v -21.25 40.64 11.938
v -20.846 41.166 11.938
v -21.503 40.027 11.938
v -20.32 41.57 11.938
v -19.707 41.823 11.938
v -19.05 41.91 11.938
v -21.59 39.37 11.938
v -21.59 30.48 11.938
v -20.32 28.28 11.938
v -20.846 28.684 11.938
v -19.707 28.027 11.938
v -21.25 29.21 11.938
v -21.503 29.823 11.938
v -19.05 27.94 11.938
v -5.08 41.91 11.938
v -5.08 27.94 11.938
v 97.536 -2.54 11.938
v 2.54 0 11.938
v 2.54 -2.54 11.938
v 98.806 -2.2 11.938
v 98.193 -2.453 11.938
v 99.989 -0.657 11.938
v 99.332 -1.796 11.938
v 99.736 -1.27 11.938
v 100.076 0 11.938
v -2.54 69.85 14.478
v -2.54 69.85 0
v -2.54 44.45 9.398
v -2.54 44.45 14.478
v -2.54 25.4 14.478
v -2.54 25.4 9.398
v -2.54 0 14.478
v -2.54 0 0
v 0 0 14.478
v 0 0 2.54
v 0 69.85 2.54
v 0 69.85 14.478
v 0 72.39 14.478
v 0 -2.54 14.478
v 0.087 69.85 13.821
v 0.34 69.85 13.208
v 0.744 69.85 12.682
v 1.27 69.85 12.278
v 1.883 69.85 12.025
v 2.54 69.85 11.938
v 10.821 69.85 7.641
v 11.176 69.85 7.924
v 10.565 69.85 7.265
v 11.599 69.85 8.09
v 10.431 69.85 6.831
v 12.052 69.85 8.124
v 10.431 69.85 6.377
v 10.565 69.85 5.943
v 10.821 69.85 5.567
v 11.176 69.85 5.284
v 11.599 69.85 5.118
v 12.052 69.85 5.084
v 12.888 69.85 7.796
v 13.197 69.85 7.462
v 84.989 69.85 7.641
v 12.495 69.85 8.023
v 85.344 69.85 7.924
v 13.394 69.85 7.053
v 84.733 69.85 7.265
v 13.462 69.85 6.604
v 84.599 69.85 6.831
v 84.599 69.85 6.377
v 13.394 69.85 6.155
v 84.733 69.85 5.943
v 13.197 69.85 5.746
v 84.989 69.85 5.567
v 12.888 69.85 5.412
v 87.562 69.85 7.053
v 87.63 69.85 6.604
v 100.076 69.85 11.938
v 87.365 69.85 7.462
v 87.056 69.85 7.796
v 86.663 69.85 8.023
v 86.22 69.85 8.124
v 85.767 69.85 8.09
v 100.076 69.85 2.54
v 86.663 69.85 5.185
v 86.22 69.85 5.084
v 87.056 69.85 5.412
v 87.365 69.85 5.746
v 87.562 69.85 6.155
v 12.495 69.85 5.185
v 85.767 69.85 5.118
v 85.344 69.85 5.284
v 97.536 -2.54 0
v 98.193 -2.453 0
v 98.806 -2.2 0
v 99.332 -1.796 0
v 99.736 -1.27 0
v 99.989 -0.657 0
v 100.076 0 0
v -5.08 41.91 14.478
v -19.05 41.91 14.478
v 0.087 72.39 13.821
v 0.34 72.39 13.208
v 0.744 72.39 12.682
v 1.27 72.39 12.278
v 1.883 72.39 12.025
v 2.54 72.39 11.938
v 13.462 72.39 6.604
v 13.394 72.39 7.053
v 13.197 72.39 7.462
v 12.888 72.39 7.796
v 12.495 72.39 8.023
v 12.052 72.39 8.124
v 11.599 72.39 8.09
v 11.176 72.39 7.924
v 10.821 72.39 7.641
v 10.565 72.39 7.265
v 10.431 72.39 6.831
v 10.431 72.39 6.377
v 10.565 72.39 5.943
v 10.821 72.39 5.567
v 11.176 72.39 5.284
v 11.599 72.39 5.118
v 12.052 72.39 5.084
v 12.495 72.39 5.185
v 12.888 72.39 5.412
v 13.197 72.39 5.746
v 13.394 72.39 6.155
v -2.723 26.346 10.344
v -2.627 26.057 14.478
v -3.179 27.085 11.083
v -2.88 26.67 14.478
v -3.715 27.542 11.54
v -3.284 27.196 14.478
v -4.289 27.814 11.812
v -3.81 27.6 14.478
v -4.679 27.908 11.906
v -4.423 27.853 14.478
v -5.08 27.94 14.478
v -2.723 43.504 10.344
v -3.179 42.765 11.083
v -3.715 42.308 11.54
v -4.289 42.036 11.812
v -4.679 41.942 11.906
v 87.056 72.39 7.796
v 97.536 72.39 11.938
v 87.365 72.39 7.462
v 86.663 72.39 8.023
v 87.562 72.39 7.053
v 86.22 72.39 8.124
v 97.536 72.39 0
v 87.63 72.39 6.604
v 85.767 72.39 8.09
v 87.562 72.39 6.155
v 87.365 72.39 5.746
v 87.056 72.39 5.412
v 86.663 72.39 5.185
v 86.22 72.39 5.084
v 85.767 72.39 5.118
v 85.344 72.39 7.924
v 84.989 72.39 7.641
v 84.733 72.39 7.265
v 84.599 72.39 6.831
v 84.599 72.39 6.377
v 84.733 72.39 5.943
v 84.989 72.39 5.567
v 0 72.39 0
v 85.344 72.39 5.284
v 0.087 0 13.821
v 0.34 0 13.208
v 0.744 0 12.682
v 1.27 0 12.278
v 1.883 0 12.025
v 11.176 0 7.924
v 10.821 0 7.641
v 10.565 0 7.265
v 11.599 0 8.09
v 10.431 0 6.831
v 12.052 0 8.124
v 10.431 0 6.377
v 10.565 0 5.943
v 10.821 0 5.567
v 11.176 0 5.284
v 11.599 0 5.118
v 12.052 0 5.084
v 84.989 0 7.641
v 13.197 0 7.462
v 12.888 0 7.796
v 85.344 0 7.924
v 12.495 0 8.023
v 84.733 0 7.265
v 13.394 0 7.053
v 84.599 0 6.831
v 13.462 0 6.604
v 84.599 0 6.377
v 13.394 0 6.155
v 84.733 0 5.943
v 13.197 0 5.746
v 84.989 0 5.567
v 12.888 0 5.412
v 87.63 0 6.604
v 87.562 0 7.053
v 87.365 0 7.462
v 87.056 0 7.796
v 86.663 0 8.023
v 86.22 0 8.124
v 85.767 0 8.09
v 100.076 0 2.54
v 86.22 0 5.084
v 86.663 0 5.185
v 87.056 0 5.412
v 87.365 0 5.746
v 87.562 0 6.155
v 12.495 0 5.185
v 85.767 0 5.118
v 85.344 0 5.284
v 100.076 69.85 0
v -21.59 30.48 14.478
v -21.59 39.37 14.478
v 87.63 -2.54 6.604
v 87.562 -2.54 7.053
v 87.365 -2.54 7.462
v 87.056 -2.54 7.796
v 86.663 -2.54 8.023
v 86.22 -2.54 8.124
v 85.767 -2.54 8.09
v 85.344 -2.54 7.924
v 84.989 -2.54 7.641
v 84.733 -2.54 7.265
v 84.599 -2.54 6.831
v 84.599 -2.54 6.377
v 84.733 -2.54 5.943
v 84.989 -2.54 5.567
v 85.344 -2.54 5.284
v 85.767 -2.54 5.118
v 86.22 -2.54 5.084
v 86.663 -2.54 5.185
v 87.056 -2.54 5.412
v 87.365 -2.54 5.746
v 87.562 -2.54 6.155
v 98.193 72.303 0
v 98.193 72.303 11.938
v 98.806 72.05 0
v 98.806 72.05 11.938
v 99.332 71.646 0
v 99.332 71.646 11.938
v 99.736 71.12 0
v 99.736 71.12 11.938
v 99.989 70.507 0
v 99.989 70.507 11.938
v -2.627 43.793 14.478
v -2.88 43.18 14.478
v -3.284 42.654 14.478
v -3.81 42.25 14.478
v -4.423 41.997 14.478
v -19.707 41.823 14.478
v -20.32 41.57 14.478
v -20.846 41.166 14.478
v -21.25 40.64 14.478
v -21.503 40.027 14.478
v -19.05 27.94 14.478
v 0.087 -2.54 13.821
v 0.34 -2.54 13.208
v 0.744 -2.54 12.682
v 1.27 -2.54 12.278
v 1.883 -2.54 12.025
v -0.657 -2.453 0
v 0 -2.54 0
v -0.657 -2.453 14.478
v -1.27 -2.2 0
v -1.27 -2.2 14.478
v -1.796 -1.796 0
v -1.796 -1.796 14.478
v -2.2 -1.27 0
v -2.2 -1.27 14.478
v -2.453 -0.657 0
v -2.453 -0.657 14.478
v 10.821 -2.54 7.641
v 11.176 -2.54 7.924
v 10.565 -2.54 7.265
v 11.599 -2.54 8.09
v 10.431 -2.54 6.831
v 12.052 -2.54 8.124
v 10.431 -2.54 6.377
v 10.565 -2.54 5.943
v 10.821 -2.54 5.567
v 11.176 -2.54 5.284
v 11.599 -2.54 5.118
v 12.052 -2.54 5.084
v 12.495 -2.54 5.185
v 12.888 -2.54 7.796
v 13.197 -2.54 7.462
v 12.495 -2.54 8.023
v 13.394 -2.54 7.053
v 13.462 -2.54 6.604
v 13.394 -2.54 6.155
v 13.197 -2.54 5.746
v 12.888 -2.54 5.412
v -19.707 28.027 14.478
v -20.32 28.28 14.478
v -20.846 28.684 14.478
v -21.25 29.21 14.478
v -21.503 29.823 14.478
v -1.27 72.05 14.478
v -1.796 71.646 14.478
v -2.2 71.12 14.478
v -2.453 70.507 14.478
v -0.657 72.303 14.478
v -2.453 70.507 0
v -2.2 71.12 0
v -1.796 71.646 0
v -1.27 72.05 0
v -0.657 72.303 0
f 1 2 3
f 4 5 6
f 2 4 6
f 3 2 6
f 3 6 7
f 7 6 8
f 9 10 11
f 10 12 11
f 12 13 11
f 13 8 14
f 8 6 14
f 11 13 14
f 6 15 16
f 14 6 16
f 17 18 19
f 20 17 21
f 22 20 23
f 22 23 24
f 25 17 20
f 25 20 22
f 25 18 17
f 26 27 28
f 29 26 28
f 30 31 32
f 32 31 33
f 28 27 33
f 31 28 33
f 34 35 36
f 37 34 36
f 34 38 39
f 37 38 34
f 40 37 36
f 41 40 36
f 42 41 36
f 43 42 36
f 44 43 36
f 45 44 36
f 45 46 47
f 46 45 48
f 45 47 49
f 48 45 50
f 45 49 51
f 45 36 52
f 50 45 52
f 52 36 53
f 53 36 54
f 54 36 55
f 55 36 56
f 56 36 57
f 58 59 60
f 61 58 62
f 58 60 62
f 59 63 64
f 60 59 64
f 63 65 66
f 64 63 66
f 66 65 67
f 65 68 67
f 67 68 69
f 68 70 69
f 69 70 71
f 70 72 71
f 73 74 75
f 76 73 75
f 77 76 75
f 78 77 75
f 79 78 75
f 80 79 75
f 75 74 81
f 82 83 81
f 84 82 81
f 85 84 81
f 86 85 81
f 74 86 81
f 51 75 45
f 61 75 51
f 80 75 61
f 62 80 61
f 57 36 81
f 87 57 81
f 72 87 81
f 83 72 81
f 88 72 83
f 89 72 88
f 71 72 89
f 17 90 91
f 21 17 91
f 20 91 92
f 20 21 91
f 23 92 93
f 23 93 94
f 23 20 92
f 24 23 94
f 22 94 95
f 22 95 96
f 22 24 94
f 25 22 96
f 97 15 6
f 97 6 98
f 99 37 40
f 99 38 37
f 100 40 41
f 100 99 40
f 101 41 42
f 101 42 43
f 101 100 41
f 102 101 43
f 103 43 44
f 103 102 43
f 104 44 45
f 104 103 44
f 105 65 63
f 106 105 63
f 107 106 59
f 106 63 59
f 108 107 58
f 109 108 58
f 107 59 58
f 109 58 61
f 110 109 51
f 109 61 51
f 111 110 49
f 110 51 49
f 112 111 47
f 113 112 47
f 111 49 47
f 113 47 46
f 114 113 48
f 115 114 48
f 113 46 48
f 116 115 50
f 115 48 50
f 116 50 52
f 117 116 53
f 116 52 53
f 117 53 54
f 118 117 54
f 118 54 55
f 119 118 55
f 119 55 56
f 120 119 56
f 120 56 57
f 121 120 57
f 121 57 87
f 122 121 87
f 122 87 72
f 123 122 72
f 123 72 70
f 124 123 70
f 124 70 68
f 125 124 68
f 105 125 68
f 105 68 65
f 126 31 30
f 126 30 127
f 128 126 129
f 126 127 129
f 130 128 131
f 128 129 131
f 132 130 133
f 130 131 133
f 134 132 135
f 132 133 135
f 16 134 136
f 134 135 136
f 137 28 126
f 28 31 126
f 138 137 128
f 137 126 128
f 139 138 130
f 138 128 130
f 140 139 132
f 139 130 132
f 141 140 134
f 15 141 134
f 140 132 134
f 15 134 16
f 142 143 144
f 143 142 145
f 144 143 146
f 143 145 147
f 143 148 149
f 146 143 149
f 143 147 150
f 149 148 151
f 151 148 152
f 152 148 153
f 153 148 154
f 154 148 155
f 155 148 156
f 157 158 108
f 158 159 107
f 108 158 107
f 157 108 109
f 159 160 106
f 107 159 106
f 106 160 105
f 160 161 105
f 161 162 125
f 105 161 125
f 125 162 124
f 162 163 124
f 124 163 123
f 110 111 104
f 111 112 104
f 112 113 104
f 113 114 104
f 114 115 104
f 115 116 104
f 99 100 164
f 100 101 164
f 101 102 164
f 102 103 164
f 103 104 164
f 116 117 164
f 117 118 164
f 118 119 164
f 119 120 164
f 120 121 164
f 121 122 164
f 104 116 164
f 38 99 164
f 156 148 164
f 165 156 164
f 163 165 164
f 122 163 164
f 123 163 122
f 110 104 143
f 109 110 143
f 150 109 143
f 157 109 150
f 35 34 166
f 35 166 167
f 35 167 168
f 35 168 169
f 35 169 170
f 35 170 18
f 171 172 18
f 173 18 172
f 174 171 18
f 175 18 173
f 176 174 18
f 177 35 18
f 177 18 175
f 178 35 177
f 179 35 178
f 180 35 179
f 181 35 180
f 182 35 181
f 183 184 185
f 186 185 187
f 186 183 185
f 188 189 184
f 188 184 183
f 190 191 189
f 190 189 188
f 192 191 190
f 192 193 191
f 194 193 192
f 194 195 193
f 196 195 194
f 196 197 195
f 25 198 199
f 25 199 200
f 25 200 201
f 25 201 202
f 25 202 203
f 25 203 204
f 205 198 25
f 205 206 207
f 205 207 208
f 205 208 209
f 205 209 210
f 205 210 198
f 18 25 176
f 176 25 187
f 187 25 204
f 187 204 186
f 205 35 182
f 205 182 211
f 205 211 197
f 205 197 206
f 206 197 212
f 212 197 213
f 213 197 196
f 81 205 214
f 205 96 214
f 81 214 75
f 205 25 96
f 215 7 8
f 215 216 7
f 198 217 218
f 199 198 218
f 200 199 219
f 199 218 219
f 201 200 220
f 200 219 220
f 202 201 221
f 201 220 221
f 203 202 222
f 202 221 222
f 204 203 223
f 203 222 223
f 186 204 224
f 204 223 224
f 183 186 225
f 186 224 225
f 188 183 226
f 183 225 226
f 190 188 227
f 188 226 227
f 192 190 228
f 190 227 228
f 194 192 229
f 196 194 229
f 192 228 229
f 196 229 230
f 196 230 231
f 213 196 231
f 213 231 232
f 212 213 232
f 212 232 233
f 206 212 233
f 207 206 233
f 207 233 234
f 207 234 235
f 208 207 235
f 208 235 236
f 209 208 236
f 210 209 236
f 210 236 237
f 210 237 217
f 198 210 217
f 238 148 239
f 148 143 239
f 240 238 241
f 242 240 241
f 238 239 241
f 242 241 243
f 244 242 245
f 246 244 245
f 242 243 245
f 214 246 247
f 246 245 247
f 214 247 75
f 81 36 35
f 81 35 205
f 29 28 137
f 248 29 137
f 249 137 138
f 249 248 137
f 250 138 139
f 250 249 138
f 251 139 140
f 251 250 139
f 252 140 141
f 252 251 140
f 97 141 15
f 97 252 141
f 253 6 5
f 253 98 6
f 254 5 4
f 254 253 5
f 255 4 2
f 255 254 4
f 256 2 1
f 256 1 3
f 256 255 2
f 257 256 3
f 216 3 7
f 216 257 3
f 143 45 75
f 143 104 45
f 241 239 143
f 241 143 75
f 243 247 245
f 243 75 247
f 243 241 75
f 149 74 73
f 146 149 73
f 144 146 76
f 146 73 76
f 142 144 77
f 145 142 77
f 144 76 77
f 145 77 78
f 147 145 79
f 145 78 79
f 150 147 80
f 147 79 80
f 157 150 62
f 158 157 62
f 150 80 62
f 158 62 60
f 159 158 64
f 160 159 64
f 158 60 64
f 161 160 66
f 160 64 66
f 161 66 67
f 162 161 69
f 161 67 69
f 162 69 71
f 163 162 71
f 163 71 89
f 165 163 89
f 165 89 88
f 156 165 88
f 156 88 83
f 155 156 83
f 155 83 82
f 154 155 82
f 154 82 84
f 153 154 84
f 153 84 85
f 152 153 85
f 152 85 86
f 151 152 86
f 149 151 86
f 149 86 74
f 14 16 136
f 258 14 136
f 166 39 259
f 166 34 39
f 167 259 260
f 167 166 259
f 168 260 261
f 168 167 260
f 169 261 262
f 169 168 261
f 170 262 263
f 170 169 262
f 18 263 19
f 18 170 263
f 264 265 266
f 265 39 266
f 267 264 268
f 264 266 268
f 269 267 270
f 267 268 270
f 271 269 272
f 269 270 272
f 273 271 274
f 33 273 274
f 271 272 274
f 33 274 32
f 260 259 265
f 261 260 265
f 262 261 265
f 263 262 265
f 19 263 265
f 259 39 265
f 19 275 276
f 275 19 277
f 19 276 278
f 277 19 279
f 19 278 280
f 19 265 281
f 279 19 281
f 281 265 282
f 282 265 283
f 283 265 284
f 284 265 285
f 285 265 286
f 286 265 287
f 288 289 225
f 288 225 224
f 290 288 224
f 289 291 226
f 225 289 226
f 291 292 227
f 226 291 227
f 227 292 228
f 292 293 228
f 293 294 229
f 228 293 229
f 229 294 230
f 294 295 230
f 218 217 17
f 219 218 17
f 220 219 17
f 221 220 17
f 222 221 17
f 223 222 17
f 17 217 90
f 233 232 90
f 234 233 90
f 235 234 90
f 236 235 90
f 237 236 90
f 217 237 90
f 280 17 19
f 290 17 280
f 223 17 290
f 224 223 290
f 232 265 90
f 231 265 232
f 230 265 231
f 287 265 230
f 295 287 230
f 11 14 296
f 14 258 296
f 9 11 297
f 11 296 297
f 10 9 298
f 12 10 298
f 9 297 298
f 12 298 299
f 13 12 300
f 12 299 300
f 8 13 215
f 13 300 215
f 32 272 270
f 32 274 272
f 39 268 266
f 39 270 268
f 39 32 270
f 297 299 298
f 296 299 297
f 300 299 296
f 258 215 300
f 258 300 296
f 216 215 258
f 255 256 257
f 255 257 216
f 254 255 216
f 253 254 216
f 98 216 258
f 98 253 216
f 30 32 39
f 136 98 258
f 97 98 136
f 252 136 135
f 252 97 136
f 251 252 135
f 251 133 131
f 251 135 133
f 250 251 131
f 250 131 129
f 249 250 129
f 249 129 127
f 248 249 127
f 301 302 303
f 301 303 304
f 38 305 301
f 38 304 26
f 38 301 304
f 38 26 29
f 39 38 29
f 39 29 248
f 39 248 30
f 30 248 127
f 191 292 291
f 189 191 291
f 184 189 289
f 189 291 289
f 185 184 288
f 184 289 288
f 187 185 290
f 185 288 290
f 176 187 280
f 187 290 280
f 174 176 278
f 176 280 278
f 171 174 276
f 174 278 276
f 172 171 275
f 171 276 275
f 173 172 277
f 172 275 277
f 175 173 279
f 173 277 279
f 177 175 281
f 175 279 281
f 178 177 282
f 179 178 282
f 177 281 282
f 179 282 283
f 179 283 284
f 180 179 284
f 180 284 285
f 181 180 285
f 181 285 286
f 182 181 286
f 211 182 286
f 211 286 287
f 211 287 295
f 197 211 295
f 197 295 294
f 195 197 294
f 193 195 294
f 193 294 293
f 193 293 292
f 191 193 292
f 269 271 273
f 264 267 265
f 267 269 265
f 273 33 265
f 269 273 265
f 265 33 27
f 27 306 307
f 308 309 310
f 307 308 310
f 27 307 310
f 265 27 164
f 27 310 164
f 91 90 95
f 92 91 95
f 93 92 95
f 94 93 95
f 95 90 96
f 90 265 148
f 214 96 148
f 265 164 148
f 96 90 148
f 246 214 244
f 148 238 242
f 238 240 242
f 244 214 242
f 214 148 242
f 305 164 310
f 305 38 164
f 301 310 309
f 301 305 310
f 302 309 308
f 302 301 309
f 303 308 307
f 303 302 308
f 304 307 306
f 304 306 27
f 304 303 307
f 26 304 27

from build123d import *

# Parameters (mm, degrees)
F0_W     = 100.076
F0_H     = 2.54
F1_DEPTH = 11.938
F0_H_2   = 69.85
F2_DEPTH = 2.54
F4_DEPTH = 14.478
F5_W     = 13.97
F5_H     = 2.54
F6_DEPTH = 19.05
F7_R     = 2.5399
F3_R     = 1.524
F8_DEPTH = 76.2


# Not quite as in the source:
# - a fillet or chamfer is up to 0.001 mm smaller than in the source, because OpenCascade refuses the exact size


with BuildPart() as f1:
    # F0 (on Top) → F1 (new body)
    with BuildSketch(Plane.XY):
        with Locations((50.038, 71.12)):
            Rectangle(F0_W, F0_H)
    extrude(amount=F1_DEPTH)



with BuildPart() as f1b:
    # F0 (on Top) → F1, piece 2 (new body)
    with BuildSketch(Plane.XY):
        with Locations((50.038, -1.27)):
            Rectangle(F0_W, F0_H)
    extrude(amount=F1_DEPTH)


with BuildPart() as f1_1:
    add(f1.part)

    add(f1b.part)  # F2 merges F1b
    # F0 (on Top) → F2 (join)
    with BuildSketch(Plane.XY):
        with Locations((50.038, 34.925)):
            Rectangle(F0_W, F0_H_2)
    extrude(amount=F2_DEPTH)

    # F0 (on Top) → F4 (join)
    with BuildSketch(Plane.XY):
        Polygon((0, -2.54), (0, 0), (0, 69.85), (0, 72.39), (-2.54, 72.39), (-2.54, -2.54), align=None)
    extrude(amount=F4_DEPTH)

    # F5 (on face) → F6 (join)
    with BuildSketch(Plane(origin=(-2.54, 0, 0), x_dir=(0, -1, 0), z_dir=(-1, 0, 0))):
        with Locations((-34.925, 13.208)):
            Rectangle(F5_W, F5_H)
    extrude(amount=F6_DEPTH)

    # F7 (radius 2.54 in the source; OpenCascade refuses exactly that, so slightly less here)
    f7_edges = [f1_1.edges().sort_by_distance(p)[0] for p in [
        (-21.59, 27.94, 13.208),
        (-21.59, 41.91, 13.208),
        (-2.54, 41.91, 13.208),
        (-2.54, 27.94, 13.208),
        (-2.54, -2.54, 7.239),
        (100.076, -2.54, 5.969),
        (100.076, 72.39, 5.969),
        (-2.54, 72.39, 7.239),
        (0, 71.12, 11.938),
        (0, -1.27, 11.938),
        (-2.54, 34.925, 11.938),
    ]]
    fillet(f7_edges, radius=F7_R)

    # F3 (on face) → F8 (cut)
    with BuildSketch(Plane.XZ.offset(2.54)):
        with Locations((86.106, 6.604)):
            Circle(F3_R)
        with Locations((11.938, 6.604)):
            Circle(F3_R)
    extrude(amount=-F8_DEPTH, mode=Mode.SUBTRACT)


solid = f1_1.part
